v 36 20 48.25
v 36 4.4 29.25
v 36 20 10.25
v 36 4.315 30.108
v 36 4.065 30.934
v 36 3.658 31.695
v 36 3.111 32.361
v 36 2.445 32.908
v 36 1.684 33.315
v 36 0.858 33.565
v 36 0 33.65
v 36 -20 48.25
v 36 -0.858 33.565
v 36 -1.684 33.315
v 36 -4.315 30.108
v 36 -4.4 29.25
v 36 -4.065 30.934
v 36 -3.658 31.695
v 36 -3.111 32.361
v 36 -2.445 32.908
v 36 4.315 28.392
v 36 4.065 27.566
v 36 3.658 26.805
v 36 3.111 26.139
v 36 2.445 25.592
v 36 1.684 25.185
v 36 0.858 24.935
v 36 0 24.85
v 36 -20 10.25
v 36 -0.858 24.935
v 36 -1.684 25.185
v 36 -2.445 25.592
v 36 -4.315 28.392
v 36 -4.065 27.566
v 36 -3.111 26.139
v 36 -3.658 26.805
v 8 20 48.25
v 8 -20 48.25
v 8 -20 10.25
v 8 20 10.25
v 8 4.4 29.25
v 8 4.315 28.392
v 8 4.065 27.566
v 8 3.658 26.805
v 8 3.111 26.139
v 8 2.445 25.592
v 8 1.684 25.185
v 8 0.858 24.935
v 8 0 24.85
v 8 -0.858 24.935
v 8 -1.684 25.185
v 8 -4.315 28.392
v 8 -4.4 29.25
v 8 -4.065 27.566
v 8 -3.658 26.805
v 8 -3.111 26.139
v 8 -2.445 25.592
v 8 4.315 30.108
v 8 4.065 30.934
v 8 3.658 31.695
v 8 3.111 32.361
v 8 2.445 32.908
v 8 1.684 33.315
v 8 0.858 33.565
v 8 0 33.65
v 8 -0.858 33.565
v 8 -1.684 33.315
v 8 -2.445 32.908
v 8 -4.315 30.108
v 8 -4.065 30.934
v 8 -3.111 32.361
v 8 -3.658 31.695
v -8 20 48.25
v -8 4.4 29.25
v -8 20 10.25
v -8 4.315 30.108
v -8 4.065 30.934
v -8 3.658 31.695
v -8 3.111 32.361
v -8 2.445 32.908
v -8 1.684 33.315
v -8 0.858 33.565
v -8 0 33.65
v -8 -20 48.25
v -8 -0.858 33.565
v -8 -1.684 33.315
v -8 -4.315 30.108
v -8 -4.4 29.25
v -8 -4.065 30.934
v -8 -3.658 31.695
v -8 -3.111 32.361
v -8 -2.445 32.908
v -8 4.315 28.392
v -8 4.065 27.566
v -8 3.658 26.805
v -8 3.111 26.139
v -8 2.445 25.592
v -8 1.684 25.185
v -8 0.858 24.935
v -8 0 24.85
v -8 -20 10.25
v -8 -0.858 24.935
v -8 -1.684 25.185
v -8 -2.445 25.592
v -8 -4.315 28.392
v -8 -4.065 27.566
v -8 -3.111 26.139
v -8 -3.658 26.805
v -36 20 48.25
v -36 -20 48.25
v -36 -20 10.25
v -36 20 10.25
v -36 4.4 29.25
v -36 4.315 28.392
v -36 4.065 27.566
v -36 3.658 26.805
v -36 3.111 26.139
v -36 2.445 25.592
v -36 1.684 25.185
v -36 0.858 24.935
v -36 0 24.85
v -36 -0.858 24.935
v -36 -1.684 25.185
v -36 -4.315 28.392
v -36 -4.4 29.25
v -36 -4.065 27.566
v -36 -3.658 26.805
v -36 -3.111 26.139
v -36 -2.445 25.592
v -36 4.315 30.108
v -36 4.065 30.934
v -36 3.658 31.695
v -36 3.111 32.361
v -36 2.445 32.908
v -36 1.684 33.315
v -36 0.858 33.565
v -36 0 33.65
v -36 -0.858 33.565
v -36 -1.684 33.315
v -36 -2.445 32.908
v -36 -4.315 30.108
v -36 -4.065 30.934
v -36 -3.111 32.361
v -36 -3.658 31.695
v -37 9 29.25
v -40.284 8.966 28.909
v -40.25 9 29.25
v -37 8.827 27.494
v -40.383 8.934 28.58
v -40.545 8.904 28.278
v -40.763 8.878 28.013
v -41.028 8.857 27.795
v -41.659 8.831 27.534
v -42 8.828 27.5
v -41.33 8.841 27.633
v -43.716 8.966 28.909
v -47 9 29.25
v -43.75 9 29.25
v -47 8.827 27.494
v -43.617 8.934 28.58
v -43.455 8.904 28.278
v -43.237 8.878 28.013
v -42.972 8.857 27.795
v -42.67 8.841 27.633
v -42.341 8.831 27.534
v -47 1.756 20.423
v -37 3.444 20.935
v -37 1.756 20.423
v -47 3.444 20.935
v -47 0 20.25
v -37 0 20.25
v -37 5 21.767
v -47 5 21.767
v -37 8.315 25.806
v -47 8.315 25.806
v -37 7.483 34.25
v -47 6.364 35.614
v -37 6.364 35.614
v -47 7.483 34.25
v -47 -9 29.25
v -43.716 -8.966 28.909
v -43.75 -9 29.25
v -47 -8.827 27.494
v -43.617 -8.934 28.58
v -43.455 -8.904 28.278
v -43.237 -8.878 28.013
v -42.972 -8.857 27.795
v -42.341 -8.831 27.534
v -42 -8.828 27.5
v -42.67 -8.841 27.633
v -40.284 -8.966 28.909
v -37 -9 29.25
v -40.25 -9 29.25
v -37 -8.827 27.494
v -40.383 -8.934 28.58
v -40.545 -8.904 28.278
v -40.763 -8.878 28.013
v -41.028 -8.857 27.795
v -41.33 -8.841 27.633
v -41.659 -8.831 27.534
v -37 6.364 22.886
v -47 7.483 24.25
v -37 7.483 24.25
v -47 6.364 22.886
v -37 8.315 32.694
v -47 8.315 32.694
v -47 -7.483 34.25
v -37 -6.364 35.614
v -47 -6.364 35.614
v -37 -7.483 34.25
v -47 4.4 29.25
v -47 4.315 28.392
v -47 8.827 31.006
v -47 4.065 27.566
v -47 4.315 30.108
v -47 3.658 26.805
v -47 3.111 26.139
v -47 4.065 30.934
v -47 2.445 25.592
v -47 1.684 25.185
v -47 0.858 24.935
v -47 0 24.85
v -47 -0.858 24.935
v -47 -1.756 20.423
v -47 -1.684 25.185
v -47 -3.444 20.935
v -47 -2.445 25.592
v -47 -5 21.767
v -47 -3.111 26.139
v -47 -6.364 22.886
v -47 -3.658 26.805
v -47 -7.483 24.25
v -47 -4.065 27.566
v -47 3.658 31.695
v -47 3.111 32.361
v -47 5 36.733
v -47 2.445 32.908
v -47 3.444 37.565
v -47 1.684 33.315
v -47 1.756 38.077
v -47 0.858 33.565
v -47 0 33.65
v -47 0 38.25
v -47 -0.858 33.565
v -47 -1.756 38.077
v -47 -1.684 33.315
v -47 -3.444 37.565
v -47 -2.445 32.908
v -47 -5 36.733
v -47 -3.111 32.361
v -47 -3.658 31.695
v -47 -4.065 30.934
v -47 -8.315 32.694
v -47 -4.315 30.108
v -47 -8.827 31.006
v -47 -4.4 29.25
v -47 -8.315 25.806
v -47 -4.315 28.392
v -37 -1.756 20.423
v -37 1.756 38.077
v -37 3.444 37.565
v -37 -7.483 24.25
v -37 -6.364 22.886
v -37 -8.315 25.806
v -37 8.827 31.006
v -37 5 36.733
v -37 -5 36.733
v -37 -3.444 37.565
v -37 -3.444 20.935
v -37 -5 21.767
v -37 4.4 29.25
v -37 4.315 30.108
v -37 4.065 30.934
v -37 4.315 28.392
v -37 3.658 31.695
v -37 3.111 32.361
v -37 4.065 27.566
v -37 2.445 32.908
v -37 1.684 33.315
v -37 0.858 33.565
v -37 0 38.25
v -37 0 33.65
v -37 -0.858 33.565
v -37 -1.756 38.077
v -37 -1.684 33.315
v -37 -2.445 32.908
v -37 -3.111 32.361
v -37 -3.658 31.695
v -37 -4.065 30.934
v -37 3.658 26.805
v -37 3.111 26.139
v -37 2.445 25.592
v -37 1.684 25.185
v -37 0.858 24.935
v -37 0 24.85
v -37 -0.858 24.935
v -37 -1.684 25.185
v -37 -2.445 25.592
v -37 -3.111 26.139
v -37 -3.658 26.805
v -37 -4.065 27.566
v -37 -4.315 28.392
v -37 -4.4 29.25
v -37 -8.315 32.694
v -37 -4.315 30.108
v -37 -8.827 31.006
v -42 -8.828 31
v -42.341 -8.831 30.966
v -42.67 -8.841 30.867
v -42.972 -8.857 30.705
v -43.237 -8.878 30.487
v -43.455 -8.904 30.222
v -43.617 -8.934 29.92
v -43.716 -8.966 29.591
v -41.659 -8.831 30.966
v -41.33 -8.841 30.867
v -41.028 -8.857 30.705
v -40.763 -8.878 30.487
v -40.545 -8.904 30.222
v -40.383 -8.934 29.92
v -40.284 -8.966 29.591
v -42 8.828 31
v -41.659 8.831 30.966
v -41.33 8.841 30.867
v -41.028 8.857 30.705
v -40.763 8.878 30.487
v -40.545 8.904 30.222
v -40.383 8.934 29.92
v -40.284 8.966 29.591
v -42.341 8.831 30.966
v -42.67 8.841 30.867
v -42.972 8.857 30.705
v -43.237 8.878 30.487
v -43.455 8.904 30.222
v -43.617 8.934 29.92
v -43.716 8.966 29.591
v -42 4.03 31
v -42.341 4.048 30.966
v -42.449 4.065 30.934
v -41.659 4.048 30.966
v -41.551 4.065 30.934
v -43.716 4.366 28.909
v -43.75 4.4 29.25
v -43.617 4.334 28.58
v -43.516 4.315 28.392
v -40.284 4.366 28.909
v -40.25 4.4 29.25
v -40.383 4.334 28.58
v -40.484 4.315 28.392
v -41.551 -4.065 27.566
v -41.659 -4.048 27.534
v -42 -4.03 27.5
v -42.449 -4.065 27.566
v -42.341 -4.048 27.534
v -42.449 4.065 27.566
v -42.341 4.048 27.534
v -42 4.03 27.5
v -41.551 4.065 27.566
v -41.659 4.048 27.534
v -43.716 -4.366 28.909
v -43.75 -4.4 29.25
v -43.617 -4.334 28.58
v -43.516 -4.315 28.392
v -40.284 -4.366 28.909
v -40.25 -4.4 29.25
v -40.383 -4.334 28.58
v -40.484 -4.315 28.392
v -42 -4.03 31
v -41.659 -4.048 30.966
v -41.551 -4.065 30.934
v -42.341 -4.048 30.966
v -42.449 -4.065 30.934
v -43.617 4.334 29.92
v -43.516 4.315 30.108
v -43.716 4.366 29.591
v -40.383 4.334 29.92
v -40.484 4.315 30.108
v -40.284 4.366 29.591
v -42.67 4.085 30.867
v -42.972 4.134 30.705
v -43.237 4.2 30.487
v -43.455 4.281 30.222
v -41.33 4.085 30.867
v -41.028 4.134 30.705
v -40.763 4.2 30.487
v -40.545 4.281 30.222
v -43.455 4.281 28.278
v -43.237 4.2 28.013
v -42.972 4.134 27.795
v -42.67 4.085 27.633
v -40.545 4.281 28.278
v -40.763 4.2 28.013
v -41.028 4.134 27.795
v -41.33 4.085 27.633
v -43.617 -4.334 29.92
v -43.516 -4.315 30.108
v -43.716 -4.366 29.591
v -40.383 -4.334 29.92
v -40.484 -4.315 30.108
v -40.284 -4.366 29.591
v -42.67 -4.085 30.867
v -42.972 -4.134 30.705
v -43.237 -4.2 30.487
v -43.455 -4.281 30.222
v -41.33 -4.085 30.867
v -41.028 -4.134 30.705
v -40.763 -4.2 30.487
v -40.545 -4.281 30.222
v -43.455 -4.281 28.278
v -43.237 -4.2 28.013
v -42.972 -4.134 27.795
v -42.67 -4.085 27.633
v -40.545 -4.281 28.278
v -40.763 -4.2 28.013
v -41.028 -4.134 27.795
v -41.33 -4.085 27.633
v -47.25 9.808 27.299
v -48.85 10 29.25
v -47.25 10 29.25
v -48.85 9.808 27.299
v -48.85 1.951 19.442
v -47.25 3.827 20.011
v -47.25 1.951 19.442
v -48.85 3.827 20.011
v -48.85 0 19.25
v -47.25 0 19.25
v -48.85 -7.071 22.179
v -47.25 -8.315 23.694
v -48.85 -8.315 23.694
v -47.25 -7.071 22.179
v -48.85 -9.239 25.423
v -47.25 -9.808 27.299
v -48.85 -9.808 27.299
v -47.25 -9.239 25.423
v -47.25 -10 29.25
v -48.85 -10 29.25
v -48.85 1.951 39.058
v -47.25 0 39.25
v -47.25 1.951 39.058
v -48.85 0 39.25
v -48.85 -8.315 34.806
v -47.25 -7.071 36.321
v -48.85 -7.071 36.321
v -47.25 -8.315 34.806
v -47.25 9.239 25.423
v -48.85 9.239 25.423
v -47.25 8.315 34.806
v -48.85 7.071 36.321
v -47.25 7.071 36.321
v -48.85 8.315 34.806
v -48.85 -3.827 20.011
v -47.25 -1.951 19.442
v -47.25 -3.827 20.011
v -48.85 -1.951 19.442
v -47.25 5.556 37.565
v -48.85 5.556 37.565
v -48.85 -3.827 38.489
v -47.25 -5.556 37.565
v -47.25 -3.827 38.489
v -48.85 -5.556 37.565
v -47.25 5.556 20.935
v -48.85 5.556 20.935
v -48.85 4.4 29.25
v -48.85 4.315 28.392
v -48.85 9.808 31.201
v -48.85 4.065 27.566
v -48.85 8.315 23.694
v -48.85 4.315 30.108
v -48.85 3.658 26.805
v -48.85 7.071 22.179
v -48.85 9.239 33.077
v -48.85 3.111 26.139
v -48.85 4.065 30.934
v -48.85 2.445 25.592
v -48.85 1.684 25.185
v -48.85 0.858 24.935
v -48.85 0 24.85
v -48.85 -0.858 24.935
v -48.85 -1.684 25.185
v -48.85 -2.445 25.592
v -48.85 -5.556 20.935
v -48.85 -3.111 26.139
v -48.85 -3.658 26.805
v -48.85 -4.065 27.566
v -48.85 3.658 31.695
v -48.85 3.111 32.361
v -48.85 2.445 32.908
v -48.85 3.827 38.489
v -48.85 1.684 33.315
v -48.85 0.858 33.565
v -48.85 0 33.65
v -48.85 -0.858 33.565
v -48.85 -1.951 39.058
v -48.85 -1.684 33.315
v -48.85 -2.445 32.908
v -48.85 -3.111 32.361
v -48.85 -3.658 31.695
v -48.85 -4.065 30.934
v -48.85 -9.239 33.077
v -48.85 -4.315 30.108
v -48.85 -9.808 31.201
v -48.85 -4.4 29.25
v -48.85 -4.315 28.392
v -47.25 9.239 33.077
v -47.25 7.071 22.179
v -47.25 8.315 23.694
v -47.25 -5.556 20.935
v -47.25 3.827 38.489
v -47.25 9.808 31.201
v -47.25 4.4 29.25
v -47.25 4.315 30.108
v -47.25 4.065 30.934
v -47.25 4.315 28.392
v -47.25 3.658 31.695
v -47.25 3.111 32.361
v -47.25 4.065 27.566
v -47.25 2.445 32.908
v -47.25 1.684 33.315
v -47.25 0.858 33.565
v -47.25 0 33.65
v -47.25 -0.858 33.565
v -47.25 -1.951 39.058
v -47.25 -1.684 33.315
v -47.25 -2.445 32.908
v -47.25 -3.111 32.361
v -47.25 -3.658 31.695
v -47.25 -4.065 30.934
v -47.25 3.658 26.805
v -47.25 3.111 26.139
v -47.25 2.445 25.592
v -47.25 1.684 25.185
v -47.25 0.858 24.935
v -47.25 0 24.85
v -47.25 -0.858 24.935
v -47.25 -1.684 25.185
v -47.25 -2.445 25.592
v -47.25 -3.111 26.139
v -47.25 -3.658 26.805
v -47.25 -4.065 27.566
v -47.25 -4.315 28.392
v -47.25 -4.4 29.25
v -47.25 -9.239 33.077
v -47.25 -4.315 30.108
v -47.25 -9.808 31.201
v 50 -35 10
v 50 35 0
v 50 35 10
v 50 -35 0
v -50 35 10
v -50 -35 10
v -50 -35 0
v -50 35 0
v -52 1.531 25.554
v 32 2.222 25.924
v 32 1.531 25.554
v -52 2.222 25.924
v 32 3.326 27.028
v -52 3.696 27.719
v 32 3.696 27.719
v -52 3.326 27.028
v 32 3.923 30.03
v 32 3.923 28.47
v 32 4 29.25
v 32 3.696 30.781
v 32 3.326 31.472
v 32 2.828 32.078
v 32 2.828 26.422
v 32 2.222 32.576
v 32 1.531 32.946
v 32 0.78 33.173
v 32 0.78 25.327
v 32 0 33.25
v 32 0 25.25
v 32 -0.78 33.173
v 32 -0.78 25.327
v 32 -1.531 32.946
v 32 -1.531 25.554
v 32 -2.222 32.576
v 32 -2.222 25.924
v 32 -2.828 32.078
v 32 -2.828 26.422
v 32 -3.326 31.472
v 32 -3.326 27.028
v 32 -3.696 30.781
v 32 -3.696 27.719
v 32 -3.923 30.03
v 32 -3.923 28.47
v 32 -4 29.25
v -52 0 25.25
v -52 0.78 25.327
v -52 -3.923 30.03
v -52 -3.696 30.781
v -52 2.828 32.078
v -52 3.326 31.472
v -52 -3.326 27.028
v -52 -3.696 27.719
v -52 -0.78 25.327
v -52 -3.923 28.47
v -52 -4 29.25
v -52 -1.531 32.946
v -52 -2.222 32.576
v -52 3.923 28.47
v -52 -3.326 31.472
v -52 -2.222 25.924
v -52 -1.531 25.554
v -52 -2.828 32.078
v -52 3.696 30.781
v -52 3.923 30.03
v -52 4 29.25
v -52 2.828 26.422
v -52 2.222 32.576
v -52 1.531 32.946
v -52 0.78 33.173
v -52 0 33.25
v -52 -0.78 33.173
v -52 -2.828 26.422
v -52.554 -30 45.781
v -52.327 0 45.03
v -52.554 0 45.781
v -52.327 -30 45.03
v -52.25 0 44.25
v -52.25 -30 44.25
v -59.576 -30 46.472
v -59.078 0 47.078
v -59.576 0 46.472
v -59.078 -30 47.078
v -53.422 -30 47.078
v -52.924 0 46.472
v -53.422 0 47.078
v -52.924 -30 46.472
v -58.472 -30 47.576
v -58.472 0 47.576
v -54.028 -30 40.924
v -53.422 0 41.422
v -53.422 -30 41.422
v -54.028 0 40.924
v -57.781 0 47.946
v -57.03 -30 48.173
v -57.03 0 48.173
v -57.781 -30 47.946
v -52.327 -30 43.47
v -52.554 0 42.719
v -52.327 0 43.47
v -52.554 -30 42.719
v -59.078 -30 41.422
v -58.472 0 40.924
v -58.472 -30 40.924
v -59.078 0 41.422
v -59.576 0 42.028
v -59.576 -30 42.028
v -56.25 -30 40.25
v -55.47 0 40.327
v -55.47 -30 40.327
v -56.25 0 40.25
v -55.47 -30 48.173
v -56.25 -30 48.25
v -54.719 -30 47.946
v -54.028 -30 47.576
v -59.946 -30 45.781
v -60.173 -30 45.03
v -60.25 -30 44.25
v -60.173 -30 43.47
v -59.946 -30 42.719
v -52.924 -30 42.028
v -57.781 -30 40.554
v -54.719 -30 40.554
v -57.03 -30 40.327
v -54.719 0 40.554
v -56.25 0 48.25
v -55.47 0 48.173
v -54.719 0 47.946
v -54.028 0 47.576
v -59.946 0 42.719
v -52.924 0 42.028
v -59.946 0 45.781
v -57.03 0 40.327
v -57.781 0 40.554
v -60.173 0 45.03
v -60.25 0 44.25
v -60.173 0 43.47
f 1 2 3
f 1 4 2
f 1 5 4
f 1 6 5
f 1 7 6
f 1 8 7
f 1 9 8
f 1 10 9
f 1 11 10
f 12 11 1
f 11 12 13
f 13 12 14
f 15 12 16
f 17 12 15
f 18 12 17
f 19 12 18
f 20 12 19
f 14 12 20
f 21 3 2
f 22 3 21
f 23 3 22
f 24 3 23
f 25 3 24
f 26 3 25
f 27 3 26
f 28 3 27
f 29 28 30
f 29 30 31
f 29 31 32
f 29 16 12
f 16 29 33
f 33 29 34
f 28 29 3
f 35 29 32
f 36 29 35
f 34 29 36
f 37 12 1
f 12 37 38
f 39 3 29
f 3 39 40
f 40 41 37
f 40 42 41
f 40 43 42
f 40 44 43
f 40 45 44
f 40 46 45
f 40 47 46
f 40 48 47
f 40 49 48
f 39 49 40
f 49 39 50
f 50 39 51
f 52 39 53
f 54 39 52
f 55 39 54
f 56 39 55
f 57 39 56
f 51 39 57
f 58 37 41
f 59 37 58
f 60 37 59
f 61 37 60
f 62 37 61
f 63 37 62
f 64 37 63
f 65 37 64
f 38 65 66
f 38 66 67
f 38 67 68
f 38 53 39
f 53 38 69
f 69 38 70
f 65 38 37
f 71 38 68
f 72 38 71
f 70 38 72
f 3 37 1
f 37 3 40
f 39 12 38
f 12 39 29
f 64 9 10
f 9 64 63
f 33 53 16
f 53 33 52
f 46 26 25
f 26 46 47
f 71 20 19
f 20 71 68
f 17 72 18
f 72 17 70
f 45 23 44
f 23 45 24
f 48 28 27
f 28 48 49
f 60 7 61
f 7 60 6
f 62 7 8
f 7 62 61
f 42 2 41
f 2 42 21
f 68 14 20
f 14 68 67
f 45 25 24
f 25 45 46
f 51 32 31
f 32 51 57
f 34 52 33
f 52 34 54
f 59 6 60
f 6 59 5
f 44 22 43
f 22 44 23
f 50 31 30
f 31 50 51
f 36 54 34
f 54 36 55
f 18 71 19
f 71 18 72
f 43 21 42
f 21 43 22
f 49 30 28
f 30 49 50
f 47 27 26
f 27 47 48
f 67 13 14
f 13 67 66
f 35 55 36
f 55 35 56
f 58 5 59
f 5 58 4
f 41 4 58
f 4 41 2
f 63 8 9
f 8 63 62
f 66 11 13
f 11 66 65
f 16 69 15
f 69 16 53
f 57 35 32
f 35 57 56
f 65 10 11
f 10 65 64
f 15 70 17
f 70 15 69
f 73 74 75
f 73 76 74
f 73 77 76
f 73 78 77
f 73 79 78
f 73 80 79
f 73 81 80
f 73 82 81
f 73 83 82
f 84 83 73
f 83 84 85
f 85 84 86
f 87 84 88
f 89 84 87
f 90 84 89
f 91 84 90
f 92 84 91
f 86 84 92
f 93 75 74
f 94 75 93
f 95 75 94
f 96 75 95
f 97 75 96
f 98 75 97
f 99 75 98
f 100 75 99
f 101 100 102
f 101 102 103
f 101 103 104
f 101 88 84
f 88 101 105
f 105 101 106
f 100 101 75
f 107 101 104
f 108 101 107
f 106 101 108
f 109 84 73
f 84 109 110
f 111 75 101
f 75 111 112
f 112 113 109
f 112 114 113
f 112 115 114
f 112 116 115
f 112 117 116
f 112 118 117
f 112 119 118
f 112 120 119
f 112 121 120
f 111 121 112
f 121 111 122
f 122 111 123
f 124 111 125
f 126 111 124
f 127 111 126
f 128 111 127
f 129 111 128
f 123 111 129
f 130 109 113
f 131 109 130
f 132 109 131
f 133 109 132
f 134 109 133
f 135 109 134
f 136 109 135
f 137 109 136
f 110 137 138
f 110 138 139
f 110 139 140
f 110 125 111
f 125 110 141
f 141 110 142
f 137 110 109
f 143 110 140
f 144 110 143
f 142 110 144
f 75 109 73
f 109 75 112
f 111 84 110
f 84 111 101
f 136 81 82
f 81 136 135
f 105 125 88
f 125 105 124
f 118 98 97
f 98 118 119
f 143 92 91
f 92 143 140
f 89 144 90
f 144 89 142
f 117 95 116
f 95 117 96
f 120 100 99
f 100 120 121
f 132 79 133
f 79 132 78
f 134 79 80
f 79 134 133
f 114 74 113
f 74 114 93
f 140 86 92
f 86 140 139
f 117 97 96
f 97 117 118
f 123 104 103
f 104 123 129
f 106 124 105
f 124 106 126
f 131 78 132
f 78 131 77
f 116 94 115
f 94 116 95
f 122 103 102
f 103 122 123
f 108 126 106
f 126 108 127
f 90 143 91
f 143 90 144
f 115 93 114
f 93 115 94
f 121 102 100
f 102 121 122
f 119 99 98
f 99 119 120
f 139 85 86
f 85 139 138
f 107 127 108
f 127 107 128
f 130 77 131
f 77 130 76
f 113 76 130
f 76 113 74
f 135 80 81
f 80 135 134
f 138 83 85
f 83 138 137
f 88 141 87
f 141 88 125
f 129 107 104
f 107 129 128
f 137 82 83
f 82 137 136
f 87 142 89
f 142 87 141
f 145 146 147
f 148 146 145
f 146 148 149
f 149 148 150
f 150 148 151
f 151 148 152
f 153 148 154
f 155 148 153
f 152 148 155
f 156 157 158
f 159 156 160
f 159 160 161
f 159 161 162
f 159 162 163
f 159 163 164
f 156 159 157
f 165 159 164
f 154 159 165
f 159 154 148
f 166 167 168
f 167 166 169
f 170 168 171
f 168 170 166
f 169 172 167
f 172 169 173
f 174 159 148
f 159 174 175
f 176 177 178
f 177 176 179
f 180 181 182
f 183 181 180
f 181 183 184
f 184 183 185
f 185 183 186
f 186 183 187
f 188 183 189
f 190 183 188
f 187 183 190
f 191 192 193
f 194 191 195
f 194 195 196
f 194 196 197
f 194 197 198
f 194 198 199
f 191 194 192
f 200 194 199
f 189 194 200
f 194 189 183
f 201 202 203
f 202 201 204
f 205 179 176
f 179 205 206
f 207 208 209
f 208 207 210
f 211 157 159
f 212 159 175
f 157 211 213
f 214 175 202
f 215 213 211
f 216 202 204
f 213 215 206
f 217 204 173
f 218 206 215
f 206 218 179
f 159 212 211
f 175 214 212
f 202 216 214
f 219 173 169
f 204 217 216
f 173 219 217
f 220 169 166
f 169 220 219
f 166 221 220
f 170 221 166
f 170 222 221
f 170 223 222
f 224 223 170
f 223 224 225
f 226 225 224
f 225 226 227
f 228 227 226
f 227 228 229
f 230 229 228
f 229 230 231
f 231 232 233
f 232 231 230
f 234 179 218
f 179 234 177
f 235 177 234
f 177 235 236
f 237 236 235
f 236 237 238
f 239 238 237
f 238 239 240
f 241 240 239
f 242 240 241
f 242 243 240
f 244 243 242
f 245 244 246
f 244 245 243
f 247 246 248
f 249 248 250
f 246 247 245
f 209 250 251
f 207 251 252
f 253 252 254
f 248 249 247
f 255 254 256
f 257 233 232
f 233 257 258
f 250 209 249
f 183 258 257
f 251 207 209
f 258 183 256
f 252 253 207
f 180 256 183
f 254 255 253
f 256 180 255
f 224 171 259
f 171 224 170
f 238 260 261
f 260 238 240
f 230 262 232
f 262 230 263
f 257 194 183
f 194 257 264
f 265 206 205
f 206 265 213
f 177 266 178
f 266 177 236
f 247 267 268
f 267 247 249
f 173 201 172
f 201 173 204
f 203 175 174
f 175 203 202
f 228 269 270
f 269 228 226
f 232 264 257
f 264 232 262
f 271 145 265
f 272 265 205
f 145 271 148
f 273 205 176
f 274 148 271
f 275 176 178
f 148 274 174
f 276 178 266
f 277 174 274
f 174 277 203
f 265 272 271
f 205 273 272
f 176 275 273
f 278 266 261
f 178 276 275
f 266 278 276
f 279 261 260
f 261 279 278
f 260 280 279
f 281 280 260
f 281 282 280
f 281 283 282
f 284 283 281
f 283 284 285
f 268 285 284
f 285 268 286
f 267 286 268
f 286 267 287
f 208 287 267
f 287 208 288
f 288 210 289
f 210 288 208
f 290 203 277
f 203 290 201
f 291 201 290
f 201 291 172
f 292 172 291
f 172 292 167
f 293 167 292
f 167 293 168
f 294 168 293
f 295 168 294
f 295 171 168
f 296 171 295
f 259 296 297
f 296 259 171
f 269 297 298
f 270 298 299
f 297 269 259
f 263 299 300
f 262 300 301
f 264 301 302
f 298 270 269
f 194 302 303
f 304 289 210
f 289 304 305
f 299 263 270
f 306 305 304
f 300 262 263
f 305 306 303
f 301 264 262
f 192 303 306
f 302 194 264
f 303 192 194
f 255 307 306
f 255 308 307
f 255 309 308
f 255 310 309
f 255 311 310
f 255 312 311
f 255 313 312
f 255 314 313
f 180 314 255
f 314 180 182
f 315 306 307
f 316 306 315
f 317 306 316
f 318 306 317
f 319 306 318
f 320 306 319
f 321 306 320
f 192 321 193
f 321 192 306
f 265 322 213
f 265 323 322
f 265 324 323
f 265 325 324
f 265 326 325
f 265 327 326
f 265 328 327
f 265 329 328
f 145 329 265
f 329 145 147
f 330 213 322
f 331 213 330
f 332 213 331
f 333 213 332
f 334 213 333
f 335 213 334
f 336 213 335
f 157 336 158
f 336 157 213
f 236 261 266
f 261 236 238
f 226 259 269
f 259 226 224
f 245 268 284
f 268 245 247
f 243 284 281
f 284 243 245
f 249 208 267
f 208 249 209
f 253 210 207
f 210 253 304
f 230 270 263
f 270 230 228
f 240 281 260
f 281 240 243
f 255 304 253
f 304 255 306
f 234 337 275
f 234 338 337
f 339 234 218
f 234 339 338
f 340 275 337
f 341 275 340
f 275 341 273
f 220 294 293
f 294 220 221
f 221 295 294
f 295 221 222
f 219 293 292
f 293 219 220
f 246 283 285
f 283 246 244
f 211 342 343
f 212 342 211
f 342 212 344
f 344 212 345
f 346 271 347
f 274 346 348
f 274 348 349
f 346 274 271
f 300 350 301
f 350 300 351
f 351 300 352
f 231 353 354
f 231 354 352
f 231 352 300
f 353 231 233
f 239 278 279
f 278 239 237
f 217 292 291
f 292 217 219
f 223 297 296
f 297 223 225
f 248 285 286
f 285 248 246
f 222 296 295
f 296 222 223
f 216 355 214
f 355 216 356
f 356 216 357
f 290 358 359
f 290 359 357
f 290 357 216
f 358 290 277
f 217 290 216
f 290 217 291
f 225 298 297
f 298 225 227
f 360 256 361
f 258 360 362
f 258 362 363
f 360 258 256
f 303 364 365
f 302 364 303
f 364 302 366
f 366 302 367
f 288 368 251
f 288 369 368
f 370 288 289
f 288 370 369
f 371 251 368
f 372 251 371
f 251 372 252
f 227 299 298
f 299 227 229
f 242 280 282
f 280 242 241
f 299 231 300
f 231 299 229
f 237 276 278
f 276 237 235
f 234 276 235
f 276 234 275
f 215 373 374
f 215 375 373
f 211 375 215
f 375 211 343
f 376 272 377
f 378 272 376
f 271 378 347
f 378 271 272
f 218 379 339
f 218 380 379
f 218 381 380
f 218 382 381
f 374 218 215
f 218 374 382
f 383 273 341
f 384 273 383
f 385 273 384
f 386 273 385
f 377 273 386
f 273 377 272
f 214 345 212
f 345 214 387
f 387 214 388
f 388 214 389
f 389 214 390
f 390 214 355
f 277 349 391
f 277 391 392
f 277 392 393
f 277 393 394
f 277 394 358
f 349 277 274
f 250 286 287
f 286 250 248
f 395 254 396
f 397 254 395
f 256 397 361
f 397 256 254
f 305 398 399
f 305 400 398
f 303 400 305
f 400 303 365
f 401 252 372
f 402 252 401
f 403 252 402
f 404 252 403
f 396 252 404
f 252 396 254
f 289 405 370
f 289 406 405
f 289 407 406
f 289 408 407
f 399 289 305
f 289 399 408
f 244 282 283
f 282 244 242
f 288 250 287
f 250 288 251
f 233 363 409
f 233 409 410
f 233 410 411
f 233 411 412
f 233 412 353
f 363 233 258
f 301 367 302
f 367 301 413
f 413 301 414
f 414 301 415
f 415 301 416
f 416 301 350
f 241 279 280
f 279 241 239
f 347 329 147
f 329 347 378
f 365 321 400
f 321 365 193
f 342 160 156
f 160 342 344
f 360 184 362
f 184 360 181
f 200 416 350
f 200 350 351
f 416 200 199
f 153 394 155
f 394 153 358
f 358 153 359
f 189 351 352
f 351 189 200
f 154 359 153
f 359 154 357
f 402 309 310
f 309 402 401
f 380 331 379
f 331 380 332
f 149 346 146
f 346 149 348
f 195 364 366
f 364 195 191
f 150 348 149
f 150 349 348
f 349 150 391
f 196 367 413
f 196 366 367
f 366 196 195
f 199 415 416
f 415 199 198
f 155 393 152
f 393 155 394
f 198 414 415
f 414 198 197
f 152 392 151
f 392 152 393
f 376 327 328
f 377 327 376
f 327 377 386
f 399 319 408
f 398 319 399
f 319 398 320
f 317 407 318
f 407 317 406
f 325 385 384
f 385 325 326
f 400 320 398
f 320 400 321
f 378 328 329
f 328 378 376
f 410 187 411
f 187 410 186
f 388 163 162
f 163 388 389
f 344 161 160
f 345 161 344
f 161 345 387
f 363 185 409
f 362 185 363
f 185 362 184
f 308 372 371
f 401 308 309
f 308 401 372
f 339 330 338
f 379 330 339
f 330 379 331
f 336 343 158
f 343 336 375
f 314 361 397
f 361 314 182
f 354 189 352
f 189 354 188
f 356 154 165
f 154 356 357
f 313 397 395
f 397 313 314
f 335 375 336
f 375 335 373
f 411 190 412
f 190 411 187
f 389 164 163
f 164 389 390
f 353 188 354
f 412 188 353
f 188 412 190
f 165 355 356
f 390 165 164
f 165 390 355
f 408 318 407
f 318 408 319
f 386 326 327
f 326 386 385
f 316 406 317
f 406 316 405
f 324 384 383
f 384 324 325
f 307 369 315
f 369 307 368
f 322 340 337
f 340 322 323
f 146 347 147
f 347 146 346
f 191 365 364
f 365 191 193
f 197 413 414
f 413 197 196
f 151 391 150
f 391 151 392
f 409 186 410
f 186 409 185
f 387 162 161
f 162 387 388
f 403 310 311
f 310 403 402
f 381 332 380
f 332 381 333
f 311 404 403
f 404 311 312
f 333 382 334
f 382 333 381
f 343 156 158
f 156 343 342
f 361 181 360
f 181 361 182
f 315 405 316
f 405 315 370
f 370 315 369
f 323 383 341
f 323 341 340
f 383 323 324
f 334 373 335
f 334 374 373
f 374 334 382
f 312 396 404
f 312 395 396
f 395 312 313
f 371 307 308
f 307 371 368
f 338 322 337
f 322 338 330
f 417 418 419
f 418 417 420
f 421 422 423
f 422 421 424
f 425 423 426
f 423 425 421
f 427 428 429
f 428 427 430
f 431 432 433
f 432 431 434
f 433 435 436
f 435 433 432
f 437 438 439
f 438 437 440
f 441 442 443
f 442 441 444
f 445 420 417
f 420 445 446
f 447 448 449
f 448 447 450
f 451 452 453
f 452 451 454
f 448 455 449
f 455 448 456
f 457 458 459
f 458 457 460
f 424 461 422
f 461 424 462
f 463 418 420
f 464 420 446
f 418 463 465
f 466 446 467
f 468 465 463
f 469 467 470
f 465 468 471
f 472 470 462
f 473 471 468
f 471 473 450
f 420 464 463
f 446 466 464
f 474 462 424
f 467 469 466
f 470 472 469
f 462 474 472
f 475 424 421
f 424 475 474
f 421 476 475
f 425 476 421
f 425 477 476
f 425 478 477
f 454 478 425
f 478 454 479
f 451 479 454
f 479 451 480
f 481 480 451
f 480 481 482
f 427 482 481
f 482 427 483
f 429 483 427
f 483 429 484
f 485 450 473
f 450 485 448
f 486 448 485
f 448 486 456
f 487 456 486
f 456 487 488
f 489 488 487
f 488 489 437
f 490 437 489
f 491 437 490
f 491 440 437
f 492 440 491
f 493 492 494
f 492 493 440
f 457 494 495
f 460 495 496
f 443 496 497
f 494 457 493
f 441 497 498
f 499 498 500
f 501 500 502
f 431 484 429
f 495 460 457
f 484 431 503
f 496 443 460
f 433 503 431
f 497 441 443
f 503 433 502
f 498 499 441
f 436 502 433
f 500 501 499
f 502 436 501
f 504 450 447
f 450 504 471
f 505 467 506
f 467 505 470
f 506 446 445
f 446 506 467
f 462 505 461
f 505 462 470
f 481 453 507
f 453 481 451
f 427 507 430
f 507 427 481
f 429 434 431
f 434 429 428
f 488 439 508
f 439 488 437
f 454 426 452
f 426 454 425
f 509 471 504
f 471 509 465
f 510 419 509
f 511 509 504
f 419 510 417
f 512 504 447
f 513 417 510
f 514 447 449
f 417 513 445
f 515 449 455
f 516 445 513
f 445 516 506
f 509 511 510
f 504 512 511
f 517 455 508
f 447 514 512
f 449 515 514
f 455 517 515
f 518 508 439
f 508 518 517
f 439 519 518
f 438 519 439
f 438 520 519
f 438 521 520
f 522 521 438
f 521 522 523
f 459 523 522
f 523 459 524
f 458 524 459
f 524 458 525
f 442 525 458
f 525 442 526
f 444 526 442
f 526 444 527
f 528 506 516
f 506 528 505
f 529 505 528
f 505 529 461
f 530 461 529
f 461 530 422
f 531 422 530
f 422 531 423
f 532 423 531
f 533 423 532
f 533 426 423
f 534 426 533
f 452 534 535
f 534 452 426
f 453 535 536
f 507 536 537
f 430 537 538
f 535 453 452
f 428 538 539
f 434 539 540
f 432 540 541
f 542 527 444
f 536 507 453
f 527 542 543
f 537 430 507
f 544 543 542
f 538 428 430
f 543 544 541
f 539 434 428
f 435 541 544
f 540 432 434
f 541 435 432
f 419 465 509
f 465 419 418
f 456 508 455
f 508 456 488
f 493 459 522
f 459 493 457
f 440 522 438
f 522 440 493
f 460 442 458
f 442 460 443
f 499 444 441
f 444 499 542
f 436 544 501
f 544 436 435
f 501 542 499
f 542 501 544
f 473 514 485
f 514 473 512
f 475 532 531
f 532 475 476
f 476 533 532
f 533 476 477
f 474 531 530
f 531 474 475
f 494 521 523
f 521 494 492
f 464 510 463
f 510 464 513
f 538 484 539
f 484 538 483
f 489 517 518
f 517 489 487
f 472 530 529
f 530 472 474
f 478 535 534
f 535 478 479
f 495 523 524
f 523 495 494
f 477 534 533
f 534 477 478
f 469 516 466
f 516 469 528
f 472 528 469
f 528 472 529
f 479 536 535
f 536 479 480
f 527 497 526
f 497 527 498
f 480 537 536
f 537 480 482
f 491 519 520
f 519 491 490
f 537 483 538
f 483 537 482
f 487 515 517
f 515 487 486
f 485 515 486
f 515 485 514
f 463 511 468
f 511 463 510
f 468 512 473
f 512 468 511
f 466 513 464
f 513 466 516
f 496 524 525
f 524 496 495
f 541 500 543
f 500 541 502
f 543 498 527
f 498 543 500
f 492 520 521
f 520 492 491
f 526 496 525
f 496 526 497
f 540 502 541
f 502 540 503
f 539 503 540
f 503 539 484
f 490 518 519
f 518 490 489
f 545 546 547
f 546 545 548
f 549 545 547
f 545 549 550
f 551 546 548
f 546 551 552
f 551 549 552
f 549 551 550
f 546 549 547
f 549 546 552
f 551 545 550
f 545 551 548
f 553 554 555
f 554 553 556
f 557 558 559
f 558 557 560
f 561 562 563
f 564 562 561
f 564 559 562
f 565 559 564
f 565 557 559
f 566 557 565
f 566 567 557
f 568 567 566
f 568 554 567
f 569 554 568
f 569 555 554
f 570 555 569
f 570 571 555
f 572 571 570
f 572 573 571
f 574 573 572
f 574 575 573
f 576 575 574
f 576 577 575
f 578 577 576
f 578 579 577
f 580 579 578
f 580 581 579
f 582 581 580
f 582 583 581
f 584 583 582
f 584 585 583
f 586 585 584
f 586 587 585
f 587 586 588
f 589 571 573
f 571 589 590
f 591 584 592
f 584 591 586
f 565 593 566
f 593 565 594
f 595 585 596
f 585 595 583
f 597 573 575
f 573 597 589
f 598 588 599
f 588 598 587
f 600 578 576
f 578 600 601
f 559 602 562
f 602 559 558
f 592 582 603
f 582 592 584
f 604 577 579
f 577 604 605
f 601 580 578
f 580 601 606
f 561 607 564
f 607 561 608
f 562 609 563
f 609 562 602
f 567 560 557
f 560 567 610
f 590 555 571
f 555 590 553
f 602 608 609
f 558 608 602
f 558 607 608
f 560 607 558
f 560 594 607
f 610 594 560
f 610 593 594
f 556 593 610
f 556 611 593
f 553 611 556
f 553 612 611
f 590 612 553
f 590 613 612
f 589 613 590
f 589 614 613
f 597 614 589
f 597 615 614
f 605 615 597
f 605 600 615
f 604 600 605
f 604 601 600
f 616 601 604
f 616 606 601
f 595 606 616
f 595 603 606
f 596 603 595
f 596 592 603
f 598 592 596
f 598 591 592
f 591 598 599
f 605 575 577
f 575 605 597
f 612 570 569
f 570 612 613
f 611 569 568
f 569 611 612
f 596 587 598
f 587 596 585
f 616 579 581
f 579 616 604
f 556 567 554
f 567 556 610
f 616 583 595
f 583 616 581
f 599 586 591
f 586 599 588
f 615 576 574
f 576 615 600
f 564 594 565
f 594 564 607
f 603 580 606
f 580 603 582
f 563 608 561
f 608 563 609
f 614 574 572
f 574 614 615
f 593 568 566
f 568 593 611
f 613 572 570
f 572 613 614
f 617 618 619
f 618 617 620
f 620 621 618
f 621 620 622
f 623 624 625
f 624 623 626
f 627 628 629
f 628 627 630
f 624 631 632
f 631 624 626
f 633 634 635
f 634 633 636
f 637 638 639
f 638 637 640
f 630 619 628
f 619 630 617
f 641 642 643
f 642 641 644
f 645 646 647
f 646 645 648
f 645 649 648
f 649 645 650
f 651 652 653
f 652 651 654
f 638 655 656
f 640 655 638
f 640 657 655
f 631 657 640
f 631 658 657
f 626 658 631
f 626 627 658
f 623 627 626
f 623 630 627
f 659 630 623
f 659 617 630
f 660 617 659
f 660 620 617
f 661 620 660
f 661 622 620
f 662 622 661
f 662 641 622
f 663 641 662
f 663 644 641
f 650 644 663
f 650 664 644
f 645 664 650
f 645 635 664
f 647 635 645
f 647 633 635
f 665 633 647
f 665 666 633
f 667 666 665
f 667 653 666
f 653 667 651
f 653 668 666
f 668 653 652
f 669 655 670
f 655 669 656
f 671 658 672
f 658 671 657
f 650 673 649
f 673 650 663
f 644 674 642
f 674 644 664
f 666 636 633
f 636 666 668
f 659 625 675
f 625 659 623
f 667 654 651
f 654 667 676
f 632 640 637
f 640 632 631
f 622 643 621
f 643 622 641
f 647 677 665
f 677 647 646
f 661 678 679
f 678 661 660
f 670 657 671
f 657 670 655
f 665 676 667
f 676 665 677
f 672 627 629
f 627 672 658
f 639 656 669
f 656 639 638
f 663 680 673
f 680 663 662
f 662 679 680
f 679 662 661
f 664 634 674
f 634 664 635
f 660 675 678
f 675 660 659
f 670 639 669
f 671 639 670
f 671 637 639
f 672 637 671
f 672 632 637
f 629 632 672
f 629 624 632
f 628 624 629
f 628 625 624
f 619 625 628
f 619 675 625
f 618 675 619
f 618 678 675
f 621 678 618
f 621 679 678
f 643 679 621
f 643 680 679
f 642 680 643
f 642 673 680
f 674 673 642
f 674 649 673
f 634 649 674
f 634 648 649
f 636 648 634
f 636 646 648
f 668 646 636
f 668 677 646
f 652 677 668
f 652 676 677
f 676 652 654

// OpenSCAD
$fn = 32;

// ------------------------------------------------------------------------
// Machine vise: screw d8, jaws 28 x 38 mm
// Every part is its own module, assembly() places every instance.
// ------------------------------------------------------------------------

// --- part 1 ---
module vise_bed() {
  difference() {
    translate([-50, -35, 0]) cube([100, 70, 10]);
  }
}

// --- part 2 ---
module vise_jaw() {
  difference() {
    translate([-14, -20, 0]) cube([28, 40, 38]);
    translate([0, 0, 19]) rotate([0, 90, 0]) cylinder(h = 30, d = 8.8, center = true);
  }
}

// --- part 3 ---
module vise_screw() {
  translate([0, 0, -42]) cylinder(h = 84, d = 8);
}

// --- part 4 ---
module screw_collar() {
  difference() {
    cylinder(h = 10, d = 18);
    translate([0, 0, -1]) cylinder(h = 12, d = 8.8);
    translate([0, 0, 5]) rotate([90, 0, 0]) cylinder(h = 20, d = 3.5, center = true);
  }
}

// --- part 5 ---
module screw_washer() {
  difference() {
      translate([0, 0, 0]) cylinder(h = 1.6, d = 20);
      translate([0, 0, -1]) cylinder(h = 3.6, d = 8.8);
    }
}

// --- part 6 ---
module vise_handle() {
  cylinder(h = 30, d = 8);
}

// --- assembly ---
module assembly() {
  color([0.80, 0.24, 0.20]) translate([0, 0, 0]) rotate([0, 0, 0]) vise_bed();
  color([0.20, 0.45, 0.75]) translate([22, 0, 10.25]) rotate([0, 0, 0]) vise_jaw();
  color([0.25, 0.62, 0.32]) translate([-22, 0, 10.25]) rotate([0, 0, 0]) vise_jaw();
  color([0.92, 0.70, 0.18]) translate([-10, 0, 29.25]) rotate([0, 90, 0]) vise_screw();
  color([0.58, 0.35, 0.70]) translate([-47, 0, 29.25]) rotate([0, 90, 0]) screw_collar();
  color([0.16, 0.66, 0.66]) translate([-48.85, 0, 29.25]) rotate([0, 90, 0]) screw_washer();
  color([0.85, 0.48, 0.18]) translate([-56.25, 0, 44.25]) rotate([90, 0, 0]) vise_handle();
}

assembly();
